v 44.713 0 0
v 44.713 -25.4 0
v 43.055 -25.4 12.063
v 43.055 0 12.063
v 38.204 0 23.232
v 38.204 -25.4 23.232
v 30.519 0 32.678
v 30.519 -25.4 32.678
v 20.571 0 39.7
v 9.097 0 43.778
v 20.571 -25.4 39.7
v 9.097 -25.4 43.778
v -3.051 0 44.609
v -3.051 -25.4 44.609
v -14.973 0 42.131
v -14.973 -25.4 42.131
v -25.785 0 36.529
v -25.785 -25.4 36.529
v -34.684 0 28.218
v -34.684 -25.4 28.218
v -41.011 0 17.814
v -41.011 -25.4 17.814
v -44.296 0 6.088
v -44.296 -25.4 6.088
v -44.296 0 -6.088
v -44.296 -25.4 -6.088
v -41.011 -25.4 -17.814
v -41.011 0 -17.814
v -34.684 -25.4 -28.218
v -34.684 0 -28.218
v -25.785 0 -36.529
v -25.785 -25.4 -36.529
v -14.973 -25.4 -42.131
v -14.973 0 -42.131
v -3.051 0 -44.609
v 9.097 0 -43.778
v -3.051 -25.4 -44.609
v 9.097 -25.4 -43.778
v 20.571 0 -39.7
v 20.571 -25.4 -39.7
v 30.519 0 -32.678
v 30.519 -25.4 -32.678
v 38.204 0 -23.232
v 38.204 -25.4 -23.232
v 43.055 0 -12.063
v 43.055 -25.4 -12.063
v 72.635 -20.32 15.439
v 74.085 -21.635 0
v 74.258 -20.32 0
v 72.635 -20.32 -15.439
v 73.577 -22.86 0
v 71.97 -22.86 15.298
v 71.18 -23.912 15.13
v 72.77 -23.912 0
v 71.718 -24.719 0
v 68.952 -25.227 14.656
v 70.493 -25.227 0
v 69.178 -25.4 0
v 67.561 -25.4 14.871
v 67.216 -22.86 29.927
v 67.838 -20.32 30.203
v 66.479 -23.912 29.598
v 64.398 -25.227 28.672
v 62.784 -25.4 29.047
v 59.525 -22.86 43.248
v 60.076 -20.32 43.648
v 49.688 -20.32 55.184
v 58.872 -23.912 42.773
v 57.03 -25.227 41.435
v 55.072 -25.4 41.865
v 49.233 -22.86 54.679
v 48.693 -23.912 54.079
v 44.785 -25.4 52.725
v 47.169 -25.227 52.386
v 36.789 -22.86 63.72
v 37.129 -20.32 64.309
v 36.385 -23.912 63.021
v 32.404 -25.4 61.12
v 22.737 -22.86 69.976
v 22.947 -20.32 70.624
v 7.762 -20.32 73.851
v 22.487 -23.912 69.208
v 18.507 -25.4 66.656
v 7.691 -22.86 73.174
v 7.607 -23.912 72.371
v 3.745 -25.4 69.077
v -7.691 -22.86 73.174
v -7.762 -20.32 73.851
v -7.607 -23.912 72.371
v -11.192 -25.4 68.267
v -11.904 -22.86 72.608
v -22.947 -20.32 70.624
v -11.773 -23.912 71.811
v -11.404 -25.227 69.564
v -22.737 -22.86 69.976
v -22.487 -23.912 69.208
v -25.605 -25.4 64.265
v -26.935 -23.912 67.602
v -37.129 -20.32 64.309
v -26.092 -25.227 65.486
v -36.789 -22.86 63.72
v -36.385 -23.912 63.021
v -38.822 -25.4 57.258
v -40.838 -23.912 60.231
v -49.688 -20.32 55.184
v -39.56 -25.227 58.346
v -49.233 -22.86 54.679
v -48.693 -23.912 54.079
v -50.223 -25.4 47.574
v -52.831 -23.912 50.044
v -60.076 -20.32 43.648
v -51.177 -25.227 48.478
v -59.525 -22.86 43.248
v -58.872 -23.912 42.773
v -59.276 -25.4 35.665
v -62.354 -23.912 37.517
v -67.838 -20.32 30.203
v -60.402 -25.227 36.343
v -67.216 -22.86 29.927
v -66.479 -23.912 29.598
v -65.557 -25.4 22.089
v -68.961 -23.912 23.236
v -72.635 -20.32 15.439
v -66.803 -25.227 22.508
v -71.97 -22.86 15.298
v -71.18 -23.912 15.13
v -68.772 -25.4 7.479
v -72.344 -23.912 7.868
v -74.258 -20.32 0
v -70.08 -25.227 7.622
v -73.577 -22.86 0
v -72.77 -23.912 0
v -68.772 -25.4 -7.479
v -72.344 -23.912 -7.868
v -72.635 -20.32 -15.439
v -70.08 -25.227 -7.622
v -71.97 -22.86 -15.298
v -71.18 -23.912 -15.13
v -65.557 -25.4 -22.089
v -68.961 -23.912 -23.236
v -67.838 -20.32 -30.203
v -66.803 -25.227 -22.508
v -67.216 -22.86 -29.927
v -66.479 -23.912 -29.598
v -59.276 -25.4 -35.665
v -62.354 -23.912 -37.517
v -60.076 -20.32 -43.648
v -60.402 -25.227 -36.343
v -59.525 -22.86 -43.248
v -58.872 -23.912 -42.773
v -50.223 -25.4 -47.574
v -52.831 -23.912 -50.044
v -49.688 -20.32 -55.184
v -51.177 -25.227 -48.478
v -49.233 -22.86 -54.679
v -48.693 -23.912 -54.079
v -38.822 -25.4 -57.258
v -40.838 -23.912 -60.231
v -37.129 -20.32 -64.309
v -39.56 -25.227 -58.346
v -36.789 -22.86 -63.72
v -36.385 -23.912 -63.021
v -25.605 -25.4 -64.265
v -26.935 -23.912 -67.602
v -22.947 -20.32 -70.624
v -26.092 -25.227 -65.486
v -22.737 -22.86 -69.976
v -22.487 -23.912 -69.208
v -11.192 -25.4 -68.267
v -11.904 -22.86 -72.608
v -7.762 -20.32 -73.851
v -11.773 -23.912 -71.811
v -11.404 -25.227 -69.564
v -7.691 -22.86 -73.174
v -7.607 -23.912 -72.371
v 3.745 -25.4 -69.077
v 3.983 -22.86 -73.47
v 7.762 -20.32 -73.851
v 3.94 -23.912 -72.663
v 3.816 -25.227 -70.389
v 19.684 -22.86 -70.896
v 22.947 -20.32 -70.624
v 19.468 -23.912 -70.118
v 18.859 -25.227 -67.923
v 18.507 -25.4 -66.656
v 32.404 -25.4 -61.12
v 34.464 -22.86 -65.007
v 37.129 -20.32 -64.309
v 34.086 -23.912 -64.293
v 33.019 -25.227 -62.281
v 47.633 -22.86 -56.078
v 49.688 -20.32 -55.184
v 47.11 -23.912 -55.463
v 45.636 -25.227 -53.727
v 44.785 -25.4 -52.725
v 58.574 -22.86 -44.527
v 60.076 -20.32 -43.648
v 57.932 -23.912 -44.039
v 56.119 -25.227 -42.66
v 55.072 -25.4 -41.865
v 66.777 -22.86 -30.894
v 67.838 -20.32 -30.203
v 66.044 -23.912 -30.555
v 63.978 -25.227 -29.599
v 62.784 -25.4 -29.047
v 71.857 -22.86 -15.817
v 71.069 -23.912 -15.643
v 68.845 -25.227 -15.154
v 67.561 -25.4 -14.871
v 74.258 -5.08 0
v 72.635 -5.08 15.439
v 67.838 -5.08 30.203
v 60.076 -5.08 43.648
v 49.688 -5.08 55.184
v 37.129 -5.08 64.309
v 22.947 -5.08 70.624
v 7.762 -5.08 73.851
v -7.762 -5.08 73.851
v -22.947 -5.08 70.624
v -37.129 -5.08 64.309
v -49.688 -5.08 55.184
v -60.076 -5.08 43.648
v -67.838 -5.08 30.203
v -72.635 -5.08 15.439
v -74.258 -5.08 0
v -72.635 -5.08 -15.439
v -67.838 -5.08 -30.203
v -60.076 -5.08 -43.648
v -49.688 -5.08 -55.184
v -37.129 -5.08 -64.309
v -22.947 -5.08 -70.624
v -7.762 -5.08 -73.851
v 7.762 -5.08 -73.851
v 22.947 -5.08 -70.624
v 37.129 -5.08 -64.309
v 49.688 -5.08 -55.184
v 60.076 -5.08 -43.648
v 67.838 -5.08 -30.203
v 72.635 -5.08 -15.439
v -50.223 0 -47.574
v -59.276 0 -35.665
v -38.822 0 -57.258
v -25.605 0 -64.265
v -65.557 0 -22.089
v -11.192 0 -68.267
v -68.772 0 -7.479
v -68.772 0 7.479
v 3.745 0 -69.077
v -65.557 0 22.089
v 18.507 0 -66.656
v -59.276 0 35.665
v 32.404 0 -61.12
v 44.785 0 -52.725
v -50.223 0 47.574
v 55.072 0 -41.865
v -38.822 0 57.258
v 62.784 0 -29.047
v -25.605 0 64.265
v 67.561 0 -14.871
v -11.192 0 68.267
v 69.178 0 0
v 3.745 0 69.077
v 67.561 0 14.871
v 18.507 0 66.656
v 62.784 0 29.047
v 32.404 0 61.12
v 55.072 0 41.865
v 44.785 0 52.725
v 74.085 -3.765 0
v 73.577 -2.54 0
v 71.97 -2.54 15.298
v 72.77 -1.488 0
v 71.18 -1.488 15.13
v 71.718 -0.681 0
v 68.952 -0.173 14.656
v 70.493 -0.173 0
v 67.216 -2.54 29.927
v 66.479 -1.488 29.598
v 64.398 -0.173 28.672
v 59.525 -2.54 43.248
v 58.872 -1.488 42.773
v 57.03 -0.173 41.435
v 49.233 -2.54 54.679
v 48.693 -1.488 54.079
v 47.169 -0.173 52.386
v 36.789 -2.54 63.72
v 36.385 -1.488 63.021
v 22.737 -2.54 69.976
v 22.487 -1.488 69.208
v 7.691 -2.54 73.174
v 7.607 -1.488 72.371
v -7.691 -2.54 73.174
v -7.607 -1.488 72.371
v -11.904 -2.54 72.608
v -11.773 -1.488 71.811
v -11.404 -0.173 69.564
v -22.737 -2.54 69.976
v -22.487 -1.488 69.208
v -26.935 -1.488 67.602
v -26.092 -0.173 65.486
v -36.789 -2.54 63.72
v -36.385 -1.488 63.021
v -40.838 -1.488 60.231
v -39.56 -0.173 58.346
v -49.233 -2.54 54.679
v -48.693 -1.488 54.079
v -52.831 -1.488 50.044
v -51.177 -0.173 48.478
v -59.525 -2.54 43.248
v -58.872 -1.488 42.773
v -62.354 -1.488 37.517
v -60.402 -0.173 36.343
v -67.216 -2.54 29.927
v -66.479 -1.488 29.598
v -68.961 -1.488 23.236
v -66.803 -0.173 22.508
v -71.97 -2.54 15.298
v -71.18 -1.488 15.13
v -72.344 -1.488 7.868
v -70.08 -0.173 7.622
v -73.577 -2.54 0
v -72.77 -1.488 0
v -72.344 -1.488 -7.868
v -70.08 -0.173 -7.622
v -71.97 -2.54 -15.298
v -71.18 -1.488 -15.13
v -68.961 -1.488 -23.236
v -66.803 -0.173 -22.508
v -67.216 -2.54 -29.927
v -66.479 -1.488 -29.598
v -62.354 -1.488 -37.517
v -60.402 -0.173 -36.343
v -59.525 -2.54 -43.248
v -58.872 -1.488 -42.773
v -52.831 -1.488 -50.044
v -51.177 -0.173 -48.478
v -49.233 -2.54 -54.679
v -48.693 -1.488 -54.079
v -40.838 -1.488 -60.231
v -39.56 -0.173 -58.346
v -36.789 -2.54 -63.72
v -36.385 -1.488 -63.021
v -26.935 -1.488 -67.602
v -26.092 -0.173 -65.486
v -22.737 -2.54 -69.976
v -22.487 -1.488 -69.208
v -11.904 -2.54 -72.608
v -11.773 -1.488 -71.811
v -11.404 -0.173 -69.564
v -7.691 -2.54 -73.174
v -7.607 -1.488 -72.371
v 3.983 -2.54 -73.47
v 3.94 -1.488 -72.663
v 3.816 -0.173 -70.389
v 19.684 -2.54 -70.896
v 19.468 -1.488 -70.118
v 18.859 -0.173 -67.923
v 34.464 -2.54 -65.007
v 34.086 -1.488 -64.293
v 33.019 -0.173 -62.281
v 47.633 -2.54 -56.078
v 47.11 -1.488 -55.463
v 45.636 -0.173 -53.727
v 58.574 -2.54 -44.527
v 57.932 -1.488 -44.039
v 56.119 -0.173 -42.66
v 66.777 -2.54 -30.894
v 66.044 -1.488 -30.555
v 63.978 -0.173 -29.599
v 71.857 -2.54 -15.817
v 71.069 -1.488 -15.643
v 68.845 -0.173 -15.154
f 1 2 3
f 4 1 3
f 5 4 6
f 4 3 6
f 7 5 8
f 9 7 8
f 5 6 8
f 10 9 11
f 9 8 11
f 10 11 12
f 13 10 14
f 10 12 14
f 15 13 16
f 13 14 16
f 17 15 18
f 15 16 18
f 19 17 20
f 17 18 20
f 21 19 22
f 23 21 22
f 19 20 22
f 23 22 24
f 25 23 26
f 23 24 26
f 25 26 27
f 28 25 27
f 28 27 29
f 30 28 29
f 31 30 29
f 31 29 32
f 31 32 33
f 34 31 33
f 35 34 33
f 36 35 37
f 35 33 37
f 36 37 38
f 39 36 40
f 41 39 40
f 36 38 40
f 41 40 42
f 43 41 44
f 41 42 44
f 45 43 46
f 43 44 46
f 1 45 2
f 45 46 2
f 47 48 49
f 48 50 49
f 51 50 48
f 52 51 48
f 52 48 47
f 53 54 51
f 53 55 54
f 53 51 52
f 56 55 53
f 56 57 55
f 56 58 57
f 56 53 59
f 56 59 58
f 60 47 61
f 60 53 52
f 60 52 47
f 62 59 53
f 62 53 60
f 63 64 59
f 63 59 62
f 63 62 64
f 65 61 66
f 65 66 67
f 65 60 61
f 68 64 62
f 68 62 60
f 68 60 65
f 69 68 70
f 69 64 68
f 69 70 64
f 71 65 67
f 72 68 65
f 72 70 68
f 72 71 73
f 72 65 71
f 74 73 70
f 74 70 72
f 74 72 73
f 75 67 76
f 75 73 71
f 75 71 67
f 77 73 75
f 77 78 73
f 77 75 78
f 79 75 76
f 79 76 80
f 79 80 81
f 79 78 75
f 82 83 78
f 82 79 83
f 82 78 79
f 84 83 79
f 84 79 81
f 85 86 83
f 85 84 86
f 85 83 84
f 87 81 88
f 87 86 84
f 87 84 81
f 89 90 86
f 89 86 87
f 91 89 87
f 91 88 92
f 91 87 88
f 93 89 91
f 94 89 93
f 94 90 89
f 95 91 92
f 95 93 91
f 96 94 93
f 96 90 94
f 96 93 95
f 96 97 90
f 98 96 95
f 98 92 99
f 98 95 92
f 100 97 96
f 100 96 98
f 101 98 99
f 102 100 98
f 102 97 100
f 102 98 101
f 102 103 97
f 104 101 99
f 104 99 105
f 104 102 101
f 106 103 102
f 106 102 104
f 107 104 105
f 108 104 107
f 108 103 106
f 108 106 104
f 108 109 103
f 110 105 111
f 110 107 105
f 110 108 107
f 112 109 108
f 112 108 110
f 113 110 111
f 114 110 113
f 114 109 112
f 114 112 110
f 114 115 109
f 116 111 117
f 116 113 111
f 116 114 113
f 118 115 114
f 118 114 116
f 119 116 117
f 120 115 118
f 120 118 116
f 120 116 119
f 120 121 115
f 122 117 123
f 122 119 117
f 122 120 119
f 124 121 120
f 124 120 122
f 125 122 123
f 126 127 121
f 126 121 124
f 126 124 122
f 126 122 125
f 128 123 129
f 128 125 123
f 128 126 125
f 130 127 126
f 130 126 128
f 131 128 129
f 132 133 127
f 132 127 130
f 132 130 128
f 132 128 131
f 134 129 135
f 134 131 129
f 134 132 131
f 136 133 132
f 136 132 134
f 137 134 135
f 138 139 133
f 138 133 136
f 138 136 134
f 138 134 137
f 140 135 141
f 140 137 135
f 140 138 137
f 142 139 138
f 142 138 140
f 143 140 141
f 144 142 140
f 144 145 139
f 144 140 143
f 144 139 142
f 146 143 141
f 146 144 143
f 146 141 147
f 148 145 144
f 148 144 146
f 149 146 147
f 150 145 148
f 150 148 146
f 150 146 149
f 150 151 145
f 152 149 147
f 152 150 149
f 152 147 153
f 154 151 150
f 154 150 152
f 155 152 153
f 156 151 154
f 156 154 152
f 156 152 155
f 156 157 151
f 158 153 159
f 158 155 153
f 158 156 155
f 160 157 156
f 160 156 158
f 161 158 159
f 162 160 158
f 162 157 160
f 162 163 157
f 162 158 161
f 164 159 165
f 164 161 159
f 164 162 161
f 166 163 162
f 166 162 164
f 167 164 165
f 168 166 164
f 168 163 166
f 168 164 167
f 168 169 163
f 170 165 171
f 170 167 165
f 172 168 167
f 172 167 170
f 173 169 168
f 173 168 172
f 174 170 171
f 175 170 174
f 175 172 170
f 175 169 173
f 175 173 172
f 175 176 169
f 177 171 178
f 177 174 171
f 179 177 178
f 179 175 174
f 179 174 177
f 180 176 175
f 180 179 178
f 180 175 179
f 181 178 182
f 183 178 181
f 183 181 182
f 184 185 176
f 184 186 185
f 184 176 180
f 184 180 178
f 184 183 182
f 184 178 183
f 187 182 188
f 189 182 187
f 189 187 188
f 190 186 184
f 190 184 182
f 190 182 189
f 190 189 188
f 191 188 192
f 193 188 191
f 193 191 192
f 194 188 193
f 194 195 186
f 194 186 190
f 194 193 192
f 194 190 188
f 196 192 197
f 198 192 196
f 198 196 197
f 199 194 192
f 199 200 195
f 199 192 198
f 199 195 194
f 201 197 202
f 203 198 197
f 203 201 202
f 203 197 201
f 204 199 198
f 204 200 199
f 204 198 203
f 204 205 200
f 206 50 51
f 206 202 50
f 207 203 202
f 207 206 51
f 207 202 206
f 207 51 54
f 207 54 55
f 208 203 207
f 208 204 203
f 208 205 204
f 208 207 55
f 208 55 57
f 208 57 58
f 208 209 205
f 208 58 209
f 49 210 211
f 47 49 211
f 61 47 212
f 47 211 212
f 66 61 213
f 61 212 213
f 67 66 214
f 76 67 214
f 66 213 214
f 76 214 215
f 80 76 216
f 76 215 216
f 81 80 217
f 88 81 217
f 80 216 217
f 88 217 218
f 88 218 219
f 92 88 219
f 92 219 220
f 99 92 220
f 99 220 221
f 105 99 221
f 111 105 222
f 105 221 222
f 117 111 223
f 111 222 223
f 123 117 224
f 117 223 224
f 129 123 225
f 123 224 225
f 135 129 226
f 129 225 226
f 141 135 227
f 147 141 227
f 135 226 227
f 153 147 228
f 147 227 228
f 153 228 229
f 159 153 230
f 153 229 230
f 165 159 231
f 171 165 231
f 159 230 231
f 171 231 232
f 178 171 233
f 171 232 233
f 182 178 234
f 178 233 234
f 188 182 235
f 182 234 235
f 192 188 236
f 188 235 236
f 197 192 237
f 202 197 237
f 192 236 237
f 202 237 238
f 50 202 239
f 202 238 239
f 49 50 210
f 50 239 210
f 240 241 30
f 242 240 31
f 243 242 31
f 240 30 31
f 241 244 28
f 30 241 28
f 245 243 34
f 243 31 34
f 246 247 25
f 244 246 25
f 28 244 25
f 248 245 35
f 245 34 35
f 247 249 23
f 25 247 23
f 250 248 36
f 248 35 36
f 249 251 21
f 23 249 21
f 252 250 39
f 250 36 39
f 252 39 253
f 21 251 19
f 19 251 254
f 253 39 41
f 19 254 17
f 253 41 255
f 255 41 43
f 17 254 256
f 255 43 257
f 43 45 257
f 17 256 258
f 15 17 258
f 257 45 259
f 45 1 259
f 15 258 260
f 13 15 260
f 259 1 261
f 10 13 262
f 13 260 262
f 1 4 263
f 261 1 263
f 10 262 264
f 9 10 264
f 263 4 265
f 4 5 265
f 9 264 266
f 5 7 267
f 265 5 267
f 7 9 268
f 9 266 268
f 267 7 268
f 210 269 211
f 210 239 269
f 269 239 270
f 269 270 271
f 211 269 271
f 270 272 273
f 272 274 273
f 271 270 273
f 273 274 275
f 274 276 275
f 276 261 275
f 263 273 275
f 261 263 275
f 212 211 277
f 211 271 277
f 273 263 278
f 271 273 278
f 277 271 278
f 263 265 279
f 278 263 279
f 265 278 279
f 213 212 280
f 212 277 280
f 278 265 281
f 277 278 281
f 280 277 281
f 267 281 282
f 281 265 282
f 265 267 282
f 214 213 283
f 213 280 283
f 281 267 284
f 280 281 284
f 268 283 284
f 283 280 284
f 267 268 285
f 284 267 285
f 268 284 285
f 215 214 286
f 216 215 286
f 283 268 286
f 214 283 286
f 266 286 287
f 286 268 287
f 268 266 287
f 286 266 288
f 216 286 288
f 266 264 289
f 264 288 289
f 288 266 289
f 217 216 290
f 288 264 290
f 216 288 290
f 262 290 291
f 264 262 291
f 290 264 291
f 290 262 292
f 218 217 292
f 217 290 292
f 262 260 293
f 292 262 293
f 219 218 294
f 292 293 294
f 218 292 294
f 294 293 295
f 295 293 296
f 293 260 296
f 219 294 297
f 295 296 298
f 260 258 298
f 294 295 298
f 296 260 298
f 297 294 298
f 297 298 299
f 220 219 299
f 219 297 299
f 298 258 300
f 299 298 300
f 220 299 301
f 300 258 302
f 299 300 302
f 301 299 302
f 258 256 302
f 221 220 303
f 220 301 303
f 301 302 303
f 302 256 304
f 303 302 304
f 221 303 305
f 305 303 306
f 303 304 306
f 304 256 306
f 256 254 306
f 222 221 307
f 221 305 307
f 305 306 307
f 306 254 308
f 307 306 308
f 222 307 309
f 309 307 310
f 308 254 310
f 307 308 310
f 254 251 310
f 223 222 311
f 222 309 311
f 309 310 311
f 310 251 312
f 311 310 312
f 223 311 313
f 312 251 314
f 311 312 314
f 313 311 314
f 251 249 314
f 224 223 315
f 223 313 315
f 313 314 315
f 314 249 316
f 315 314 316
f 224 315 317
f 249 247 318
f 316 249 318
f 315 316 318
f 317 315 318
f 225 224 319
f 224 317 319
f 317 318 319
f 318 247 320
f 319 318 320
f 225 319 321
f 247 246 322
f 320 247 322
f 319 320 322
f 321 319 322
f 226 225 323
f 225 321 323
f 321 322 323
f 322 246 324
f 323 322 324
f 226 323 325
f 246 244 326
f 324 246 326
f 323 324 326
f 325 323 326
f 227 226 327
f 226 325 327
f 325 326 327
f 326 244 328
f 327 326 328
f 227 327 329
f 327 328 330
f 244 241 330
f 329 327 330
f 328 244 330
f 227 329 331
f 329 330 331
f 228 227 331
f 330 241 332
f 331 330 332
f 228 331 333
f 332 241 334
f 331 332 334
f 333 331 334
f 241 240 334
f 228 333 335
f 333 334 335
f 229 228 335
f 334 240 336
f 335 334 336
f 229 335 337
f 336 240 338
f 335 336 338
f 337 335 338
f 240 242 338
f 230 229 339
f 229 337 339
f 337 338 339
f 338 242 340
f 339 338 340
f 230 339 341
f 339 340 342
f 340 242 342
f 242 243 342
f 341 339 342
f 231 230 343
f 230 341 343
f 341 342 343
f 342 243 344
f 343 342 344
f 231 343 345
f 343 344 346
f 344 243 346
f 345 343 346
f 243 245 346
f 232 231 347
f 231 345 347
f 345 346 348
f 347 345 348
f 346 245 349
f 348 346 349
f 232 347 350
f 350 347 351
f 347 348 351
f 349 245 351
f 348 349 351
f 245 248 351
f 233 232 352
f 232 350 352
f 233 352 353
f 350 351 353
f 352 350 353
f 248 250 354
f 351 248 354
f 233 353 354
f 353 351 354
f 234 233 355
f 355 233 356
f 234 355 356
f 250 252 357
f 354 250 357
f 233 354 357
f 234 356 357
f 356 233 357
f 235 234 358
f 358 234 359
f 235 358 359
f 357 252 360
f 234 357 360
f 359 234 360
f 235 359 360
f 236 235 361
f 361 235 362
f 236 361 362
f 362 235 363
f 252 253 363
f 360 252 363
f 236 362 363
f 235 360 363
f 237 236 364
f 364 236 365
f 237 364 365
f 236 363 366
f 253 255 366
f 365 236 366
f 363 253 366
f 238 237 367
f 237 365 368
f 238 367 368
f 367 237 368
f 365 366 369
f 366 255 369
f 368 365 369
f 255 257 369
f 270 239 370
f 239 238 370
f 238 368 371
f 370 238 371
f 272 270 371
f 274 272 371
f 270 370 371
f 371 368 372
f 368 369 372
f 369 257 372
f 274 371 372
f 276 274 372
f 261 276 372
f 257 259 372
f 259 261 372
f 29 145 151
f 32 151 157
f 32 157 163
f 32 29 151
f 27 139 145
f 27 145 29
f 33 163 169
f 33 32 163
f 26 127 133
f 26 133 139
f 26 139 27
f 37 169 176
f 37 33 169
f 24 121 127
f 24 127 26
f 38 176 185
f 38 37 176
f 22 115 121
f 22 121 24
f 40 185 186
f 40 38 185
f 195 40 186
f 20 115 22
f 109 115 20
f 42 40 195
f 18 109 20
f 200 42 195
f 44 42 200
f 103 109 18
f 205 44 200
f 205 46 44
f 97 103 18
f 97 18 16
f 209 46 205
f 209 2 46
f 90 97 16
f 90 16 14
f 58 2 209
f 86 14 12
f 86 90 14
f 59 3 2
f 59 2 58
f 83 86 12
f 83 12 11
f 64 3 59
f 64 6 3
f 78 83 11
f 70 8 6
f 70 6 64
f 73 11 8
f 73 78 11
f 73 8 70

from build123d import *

# Parameters (mm, degrees)
F0_R     = 74.258017
F1_DEPTH = 25.4
F2_R     = 44.71295
F3_DEPTH = 25.4
F4_R     = 5.08


with BuildPart() as f1:
    # F0 (on Front) → F1 (new body)
    with BuildSketch(Plane.XZ):
        Circle(F0_R)
    extrude(amount=F1_DEPTH)

    # F2 (on face) → F3 (cut)
    with BuildSketch(Plane.XZ.offset(25.4)):
        Circle(F2_R)
    extrude(amount=-F3_DEPTH, mode=Mode.SUBTRACT)

    # F4
    f4_edges = [f1.edges().sort_by_distance(p)[0] for p in [
        (-74.258017, -25.4, 0),
        (-74.258017, 0, 0),
    ]]
    fillet(f4_edges, radius=F4_R)


solid = f1.part
